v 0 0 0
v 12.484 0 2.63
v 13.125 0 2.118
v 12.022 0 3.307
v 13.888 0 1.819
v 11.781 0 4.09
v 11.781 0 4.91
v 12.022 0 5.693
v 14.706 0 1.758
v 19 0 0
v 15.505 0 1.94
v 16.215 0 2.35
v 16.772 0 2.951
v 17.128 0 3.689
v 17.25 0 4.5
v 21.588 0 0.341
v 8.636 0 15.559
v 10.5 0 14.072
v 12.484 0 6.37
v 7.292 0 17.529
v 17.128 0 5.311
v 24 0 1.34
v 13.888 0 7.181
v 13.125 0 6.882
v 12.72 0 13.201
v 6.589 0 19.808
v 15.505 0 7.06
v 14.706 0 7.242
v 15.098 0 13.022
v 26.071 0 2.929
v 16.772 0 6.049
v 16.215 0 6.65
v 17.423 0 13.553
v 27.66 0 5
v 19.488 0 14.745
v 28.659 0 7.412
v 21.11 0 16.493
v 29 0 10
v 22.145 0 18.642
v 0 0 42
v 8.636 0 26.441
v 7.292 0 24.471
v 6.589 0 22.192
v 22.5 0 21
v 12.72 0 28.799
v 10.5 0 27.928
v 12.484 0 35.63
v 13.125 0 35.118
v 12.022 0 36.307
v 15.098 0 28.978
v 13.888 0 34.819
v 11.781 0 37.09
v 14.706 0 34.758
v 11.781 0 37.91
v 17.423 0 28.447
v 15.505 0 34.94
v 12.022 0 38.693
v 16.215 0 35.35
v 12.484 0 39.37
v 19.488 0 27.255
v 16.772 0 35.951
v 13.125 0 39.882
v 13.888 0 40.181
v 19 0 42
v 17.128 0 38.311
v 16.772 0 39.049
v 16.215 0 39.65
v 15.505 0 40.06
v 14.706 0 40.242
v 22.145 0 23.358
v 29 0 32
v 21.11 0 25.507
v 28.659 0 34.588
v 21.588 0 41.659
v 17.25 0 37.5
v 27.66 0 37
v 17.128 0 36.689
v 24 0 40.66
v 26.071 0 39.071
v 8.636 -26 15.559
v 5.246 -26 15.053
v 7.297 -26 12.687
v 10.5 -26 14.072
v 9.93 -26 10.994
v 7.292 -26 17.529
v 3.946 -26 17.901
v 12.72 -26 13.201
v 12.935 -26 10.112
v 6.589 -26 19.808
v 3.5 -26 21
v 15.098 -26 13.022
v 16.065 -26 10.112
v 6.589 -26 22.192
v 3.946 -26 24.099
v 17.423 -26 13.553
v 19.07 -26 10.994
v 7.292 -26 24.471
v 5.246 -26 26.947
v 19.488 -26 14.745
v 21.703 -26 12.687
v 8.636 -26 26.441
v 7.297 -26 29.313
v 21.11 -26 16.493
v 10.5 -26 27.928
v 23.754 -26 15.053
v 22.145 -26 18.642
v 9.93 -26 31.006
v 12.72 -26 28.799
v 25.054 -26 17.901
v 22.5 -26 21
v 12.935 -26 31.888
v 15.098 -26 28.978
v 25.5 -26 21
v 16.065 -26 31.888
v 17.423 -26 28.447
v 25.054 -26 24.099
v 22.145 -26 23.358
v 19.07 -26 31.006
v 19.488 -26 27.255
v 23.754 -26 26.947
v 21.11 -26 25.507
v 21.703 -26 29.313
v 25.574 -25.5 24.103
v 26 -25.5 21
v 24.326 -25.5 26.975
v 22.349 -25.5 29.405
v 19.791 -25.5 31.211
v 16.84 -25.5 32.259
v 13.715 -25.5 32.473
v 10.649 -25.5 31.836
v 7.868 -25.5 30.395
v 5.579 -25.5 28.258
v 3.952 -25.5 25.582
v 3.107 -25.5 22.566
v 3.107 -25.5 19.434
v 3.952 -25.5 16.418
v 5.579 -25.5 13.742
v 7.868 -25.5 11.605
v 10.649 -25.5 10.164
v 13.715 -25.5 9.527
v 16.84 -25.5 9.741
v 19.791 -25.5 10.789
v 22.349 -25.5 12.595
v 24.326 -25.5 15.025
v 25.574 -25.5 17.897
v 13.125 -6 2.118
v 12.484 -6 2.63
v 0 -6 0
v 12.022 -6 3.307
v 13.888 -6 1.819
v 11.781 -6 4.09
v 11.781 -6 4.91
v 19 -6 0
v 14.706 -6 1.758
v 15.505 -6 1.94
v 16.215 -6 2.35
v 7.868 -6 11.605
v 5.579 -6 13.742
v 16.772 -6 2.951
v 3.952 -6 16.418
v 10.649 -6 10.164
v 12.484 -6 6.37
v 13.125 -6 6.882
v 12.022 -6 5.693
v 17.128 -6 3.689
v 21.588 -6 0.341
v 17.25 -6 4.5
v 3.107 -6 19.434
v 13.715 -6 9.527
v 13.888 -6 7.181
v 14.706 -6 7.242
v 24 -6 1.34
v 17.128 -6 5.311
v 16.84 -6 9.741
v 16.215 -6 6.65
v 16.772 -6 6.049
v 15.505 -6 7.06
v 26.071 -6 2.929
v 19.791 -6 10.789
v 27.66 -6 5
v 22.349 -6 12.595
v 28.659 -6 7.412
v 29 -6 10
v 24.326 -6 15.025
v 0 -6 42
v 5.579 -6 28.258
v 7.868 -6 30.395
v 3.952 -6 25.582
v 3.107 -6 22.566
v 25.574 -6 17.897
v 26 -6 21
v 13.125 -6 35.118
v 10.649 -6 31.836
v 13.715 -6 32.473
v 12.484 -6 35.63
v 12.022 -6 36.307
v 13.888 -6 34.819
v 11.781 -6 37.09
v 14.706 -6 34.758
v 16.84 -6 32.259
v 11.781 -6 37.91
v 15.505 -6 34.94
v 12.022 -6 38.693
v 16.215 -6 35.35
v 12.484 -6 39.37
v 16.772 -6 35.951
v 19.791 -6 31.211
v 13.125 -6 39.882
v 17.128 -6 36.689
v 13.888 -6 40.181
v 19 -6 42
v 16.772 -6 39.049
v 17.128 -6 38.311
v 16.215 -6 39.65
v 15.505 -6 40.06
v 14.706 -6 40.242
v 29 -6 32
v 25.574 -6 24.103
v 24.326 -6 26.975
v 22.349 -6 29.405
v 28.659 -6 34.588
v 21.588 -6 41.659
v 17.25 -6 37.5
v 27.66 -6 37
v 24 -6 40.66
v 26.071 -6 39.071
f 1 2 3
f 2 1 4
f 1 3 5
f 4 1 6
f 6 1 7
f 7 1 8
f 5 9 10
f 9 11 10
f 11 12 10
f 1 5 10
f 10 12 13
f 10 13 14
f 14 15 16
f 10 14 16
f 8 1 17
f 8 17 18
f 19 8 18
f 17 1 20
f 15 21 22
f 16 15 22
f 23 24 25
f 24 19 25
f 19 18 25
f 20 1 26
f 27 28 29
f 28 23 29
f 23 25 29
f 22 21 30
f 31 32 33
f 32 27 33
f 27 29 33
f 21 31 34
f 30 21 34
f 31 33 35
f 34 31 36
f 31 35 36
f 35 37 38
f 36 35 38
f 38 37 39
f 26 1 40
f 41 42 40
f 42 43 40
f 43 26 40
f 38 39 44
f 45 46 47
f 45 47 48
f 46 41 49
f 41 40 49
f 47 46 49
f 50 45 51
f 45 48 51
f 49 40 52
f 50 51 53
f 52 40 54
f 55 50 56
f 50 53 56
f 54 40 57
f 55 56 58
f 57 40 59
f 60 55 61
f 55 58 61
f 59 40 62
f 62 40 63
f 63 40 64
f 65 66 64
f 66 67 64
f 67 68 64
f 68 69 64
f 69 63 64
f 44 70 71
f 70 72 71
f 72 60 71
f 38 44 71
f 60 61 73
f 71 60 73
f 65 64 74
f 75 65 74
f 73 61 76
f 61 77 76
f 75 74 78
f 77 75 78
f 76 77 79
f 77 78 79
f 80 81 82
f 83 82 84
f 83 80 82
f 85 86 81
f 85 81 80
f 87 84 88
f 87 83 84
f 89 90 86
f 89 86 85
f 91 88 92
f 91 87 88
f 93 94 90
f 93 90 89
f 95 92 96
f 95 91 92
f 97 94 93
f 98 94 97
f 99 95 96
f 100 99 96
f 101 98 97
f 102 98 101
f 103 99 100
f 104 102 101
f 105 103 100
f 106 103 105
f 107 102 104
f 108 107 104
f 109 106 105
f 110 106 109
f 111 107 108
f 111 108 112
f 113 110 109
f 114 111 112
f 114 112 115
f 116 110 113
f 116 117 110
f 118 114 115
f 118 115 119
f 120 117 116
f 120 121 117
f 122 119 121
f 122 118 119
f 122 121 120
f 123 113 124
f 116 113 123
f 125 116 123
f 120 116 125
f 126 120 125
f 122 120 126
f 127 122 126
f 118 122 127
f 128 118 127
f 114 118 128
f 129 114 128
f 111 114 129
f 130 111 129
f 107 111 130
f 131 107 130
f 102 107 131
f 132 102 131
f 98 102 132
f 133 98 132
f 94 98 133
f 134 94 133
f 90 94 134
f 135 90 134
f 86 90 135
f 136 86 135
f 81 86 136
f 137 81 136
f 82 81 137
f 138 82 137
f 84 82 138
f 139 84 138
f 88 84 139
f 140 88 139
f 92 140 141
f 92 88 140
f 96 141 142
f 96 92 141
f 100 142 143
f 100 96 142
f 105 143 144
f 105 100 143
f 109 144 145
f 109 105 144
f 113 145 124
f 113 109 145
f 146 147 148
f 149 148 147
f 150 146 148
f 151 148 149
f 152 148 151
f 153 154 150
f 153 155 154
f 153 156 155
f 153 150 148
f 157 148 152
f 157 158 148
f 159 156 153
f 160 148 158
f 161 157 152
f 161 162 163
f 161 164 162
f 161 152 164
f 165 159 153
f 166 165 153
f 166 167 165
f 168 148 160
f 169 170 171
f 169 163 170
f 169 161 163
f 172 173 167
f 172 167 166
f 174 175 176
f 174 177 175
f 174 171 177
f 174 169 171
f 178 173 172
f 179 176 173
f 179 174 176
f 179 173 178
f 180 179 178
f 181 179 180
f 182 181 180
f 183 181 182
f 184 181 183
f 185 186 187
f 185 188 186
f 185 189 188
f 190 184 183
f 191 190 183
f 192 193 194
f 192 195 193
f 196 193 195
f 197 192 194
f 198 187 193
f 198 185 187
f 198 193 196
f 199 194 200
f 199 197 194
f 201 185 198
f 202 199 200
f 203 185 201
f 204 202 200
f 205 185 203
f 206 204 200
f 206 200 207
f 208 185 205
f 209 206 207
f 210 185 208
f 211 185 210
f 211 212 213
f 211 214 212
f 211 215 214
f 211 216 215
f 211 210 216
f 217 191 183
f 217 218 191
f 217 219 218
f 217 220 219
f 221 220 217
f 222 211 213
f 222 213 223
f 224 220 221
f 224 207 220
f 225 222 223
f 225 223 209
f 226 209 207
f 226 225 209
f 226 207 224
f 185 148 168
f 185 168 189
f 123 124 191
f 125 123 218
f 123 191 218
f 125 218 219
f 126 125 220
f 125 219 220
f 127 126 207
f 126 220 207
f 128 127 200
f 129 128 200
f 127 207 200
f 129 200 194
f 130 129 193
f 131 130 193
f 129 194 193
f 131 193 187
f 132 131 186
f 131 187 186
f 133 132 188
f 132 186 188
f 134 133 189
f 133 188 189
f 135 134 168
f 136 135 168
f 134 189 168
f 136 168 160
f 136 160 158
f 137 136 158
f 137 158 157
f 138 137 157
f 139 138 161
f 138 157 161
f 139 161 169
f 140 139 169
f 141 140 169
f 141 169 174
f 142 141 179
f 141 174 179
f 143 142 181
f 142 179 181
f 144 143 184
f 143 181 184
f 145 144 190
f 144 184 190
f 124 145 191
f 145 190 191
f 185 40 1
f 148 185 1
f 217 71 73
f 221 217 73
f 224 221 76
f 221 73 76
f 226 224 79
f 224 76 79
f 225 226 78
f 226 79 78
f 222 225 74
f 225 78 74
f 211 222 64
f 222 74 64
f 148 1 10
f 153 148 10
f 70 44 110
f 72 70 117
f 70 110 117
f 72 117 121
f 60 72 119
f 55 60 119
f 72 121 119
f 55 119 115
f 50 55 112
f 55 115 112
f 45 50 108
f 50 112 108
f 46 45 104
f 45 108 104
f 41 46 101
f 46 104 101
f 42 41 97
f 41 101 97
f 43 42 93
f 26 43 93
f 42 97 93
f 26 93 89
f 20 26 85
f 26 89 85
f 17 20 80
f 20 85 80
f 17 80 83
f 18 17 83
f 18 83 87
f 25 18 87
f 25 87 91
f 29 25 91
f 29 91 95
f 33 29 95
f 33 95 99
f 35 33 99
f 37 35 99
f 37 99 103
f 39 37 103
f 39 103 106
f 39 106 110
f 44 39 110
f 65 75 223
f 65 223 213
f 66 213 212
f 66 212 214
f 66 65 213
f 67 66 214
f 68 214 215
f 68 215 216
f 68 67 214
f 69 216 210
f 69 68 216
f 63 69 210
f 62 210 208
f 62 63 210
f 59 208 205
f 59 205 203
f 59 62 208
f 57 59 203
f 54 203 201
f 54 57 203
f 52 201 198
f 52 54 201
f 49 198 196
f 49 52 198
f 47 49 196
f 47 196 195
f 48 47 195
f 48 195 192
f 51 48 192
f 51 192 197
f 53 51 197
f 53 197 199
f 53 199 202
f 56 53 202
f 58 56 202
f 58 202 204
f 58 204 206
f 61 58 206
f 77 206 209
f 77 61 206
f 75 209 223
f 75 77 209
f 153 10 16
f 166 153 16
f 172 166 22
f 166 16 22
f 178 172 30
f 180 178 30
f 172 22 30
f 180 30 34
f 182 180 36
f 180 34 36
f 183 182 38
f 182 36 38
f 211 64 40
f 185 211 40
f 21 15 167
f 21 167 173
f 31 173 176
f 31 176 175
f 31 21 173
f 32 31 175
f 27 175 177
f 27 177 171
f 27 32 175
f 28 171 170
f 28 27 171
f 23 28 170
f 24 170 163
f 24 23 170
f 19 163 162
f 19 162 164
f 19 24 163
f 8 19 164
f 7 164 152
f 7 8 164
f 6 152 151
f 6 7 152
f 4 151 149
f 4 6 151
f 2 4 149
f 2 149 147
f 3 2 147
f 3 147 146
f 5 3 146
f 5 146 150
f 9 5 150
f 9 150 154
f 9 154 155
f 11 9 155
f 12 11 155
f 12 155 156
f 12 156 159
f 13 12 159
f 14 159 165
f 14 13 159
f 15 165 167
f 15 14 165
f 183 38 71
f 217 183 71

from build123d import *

# Parameters (mm, degrees)
F0_R     = 2.75
F1_DEPTH = 6
F2_R     = 11.5
F3_DEPTH = 20
F4_R     = 8
F5_DEPTH = 26.001
F6_SIZE  = 0.5


with BuildPart() as f1:
    # F0 (on Front) → F1 (new body)
    with BuildSketch(Plane.XZ):
        with BuildLine():
            Line((0, 42), (0, 0))
            Line((0, 0), (19, 0))
            ThreePointArc((19, 0), (26.071068, 2.928932), (29, 10))
            Line((29, 10), (29, 32))
            ThreePointArc((29, 32), (26.071068, 39.071068), (19, 42))
            Line((19, 42), (0, 42))
        make_face()
        with Locations((14.5, 4.5)):
            Circle(F0_R, mode=Mode.SUBTRACT)
        with Locations((14.5, 37.5)):
            Circle(F0_R, mode=Mode.SUBTRACT)
    extrude(amount=F1_DEPTH)

    # F2 (on face) → F3 (join)
    with BuildSketch(Plane.XZ.offset(6)):
        with Locations((14.5, 21)):
            Circle(F2_R)
    extrude(amount=F3_DEPTH)

    # F4 (on face) → F5 (cut, through all)
    with BuildSketch(Plane.XZ.offset(26)):
        with Locations((14.5, 21)):
            Circle(F4_R)
    extrude(amount=-F5_DEPTH, mode=Mode.SUBTRACT)

    # F6
    f6_edges = [f1.edges().sort_by_distance(p)[0] for p in [
        (3, -26, 21),
    ]]
    chamfer(f6_edges, length=F6_SIZE)


solid = f1.part
